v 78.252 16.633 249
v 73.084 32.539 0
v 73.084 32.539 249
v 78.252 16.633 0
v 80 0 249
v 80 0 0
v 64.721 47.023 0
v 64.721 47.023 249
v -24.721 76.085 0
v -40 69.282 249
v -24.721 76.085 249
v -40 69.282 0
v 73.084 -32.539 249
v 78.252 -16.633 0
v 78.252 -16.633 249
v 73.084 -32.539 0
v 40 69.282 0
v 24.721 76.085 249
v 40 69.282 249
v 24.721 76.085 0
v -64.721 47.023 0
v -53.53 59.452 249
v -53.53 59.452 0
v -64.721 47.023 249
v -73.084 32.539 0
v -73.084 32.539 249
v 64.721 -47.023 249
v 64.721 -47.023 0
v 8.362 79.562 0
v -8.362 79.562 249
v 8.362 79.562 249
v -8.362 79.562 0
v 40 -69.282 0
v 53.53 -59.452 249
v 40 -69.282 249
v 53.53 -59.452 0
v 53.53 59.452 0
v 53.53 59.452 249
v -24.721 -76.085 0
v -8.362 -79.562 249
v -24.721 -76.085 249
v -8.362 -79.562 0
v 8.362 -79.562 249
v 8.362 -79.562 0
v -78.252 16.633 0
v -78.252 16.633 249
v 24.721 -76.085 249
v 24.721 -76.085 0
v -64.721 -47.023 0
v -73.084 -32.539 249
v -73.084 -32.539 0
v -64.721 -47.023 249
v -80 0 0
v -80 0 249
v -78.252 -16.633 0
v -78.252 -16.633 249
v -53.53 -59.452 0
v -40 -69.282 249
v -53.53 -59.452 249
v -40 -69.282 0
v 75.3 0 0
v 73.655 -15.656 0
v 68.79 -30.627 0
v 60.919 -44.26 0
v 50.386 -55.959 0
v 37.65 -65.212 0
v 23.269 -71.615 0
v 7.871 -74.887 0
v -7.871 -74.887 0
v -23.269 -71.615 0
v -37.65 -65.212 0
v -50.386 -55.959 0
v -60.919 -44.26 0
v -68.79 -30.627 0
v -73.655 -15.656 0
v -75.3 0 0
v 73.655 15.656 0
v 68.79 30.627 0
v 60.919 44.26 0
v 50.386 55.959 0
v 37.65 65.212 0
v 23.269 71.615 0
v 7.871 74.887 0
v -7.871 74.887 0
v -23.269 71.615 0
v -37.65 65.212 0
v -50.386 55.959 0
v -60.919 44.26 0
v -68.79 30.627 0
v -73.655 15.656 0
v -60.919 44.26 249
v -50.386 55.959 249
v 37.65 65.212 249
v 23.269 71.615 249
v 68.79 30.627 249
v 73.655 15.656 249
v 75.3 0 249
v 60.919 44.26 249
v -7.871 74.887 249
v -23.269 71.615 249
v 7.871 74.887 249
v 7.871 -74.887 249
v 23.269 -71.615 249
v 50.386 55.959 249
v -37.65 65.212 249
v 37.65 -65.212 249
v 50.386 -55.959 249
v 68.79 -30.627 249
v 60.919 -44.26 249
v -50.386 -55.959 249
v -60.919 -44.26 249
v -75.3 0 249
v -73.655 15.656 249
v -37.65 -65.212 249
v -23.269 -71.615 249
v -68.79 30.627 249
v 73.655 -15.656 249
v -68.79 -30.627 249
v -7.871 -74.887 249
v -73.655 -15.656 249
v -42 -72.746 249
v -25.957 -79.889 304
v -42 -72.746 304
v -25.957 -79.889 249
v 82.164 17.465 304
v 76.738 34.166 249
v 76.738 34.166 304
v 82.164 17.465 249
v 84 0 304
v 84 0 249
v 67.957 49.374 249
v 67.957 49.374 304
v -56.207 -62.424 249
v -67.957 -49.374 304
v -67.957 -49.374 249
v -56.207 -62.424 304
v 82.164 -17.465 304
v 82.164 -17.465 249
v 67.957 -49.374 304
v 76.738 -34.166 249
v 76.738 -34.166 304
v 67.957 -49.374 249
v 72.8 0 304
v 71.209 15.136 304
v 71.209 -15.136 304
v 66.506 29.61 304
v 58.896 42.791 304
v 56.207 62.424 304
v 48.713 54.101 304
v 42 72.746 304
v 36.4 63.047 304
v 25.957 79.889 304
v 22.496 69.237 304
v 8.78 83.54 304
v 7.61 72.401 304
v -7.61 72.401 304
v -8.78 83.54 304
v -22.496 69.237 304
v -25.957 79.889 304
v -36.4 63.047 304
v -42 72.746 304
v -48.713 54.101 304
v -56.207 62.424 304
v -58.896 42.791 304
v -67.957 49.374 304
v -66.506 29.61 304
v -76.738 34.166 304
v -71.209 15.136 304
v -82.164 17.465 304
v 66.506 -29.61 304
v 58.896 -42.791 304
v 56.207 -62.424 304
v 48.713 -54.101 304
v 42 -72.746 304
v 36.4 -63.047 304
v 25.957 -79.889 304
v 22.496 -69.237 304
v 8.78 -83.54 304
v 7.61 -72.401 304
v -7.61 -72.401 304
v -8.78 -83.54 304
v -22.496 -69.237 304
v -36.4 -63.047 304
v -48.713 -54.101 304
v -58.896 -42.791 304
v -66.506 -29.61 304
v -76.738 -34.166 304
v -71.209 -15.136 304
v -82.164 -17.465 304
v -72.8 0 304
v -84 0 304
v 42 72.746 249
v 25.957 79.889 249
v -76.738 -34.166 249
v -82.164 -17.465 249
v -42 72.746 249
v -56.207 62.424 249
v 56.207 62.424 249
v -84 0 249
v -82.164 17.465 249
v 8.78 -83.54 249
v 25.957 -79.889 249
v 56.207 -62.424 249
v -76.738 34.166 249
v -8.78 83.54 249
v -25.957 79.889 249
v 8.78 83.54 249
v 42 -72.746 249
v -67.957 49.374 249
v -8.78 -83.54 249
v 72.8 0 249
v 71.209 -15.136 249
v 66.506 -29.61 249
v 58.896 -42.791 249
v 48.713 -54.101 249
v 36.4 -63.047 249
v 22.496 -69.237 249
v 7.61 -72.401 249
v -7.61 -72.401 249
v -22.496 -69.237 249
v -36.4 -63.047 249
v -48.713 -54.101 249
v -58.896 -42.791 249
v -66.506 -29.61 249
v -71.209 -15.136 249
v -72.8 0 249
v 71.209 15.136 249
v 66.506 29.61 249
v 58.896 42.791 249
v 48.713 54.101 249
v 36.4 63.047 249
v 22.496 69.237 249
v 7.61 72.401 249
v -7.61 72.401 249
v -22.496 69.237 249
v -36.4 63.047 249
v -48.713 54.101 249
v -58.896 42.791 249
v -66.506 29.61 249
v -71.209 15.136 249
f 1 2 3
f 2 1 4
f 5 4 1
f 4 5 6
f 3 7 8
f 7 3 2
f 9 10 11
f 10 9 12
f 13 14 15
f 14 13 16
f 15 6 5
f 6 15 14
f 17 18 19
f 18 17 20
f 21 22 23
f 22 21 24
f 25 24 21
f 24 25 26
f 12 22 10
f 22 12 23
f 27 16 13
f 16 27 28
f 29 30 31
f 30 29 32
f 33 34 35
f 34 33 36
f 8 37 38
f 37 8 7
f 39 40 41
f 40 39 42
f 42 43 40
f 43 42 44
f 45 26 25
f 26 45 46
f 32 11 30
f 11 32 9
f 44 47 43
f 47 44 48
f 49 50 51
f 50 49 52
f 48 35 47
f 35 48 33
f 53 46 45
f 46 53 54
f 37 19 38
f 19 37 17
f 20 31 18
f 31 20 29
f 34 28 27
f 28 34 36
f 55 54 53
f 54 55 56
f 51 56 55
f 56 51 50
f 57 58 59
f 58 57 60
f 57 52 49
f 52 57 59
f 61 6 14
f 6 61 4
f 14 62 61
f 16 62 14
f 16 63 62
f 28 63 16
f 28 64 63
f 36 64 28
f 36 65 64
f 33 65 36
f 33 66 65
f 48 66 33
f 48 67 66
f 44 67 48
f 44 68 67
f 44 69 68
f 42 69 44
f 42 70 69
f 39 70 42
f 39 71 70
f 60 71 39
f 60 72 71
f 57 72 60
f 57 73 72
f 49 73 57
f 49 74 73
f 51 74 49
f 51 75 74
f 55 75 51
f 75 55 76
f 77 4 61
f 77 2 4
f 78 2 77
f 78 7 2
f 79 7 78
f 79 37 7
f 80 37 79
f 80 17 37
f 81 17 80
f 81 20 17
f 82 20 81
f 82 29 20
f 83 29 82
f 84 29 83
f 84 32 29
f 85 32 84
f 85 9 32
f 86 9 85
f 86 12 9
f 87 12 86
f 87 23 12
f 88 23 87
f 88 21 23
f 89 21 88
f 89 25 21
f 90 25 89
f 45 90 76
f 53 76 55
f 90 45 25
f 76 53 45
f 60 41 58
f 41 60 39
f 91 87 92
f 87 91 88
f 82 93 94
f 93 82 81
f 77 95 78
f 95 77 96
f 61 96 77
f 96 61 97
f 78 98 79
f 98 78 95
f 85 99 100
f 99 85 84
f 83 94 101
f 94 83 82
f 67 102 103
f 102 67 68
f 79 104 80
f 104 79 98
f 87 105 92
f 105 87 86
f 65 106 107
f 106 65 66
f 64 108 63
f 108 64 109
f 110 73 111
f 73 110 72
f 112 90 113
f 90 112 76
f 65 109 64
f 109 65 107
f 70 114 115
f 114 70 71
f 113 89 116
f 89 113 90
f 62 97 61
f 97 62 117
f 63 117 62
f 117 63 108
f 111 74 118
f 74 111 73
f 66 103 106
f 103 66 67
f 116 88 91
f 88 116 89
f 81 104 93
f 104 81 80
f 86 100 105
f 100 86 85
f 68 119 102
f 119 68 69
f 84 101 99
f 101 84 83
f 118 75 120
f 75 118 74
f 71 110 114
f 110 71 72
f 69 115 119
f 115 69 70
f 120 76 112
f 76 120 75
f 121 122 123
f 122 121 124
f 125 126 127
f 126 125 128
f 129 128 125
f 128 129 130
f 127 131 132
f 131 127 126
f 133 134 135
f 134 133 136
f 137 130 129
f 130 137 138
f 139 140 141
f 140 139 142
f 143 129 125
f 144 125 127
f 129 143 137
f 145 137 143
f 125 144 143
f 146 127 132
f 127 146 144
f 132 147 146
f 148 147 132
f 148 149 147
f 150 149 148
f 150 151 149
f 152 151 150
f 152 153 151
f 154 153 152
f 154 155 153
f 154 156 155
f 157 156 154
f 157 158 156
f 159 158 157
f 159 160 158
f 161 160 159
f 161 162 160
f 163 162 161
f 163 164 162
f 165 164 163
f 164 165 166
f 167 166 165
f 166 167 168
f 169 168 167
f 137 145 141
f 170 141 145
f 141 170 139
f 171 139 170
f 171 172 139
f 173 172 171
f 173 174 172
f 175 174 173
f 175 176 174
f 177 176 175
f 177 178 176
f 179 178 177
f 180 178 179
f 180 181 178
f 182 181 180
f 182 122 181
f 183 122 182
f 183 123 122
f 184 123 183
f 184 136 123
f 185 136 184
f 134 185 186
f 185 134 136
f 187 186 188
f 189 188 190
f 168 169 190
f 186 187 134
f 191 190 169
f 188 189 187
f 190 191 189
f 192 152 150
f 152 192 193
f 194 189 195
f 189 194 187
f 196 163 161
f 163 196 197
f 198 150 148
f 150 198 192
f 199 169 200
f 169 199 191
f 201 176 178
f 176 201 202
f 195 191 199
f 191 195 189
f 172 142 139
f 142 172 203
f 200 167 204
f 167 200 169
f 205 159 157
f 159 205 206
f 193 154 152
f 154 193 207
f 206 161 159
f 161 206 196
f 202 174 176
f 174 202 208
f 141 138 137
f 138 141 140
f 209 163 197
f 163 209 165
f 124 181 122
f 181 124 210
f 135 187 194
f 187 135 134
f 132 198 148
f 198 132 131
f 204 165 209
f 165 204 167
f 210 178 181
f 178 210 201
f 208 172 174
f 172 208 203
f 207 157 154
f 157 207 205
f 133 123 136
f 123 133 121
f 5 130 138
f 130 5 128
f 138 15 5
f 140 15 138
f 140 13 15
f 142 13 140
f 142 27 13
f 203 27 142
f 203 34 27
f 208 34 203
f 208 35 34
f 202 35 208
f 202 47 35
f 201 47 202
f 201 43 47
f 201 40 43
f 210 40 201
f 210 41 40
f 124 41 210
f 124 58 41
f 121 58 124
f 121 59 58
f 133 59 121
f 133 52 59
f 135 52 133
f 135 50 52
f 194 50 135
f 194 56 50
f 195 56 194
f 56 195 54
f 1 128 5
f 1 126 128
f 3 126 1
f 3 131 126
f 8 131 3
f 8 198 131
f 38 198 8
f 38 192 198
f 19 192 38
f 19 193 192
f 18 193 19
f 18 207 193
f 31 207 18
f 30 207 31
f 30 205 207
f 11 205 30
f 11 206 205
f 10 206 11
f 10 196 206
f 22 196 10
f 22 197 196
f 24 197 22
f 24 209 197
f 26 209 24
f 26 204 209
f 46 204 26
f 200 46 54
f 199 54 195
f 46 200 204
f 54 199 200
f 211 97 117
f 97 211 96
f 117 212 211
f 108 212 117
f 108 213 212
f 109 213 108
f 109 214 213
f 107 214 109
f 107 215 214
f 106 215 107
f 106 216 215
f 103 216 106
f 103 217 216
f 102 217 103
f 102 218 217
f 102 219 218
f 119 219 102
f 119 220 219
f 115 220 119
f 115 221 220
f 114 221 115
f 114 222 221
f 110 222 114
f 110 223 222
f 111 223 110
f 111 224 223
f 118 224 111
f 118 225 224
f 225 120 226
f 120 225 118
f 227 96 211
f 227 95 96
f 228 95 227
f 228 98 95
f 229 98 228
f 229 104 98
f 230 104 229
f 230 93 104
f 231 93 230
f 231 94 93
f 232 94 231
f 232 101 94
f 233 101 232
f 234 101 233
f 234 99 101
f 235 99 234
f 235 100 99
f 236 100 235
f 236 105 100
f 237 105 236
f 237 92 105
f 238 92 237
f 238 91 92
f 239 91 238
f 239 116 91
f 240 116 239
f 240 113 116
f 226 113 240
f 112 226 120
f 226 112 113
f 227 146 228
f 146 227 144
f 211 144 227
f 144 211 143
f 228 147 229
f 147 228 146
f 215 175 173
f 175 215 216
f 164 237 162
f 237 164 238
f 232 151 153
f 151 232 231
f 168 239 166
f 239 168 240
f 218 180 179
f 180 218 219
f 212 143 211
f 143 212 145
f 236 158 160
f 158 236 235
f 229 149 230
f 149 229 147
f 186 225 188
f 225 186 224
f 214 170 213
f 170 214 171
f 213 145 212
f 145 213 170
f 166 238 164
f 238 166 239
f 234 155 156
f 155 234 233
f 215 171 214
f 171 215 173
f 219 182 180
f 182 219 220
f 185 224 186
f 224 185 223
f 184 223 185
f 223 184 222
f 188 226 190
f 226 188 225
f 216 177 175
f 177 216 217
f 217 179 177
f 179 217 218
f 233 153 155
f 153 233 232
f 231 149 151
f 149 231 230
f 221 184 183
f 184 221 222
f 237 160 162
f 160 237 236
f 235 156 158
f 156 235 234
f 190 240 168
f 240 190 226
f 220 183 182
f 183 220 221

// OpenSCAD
// Parameters
pipe_standard = 1; //[1:1:1]
nominal_diameter_mm = 160; //[80:320:1]
length_mm = 250; //[125:500:1]
pipe_outer_diameter_mm = 160; //[120:200:0.5]
wall_thickness_mm = 4.9; //[2.5:10:0.1]
include_end_fitting = 1; //[0:1:1]
fit_overlap_mm = 1; //[0.5:2:0.1]
bore_clearance_mm = 0.2; //[0:0.6:0.05]
fitting_length_mm = 55; //[30:90:1]
fitting_wall_extra_mm = 2.5; //[1:6:0.1]
fitting_outer_diameter_extra_mm = 8; //[2:20:0.5]

// HT Pipe Segment - complete geometry
module ht_pipe() {
  color([0.85, 0.85, 0.8]) {
    // Main pipe segment
    difference() {
      cylinder(h=length_mm, r=pipe_outer_diameter_mm/2, center=false);
      translate([0, 0, -bore_clearance_mm])
        cylinder(h=length_mm + 2*bore_clearance_mm, r=pipe_outer_diameter_mm/2 - wall_thickness_mm + bore_clearance_mm, center=false);
    }
    
    // End fitting (if included)
    if (include_end_fitting) {
      difference() {
        translate([0, 0, length_mm - fit_overlap_mm])
          cylinder(h=fitting_length_mm, r=pipe_outer_diameter_mm/2 + fitting_outer_diameter_extra_mm/2, center=false);
        translate([0, 0, length_mm - fit_overlap_mm - bore_clearance_mm])
          cylinder(h=fitting_length_mm + 2*bore_clearance_mm, r=pipe_outer_diameter_mm/2 - wall_thickness_mm - fitting_wall_extra_mm + bore_clearance_mm, center=false);
      }
    }
  }
}

// Assembly
module assembly() {
  ht_pipe();
}

assembly();
